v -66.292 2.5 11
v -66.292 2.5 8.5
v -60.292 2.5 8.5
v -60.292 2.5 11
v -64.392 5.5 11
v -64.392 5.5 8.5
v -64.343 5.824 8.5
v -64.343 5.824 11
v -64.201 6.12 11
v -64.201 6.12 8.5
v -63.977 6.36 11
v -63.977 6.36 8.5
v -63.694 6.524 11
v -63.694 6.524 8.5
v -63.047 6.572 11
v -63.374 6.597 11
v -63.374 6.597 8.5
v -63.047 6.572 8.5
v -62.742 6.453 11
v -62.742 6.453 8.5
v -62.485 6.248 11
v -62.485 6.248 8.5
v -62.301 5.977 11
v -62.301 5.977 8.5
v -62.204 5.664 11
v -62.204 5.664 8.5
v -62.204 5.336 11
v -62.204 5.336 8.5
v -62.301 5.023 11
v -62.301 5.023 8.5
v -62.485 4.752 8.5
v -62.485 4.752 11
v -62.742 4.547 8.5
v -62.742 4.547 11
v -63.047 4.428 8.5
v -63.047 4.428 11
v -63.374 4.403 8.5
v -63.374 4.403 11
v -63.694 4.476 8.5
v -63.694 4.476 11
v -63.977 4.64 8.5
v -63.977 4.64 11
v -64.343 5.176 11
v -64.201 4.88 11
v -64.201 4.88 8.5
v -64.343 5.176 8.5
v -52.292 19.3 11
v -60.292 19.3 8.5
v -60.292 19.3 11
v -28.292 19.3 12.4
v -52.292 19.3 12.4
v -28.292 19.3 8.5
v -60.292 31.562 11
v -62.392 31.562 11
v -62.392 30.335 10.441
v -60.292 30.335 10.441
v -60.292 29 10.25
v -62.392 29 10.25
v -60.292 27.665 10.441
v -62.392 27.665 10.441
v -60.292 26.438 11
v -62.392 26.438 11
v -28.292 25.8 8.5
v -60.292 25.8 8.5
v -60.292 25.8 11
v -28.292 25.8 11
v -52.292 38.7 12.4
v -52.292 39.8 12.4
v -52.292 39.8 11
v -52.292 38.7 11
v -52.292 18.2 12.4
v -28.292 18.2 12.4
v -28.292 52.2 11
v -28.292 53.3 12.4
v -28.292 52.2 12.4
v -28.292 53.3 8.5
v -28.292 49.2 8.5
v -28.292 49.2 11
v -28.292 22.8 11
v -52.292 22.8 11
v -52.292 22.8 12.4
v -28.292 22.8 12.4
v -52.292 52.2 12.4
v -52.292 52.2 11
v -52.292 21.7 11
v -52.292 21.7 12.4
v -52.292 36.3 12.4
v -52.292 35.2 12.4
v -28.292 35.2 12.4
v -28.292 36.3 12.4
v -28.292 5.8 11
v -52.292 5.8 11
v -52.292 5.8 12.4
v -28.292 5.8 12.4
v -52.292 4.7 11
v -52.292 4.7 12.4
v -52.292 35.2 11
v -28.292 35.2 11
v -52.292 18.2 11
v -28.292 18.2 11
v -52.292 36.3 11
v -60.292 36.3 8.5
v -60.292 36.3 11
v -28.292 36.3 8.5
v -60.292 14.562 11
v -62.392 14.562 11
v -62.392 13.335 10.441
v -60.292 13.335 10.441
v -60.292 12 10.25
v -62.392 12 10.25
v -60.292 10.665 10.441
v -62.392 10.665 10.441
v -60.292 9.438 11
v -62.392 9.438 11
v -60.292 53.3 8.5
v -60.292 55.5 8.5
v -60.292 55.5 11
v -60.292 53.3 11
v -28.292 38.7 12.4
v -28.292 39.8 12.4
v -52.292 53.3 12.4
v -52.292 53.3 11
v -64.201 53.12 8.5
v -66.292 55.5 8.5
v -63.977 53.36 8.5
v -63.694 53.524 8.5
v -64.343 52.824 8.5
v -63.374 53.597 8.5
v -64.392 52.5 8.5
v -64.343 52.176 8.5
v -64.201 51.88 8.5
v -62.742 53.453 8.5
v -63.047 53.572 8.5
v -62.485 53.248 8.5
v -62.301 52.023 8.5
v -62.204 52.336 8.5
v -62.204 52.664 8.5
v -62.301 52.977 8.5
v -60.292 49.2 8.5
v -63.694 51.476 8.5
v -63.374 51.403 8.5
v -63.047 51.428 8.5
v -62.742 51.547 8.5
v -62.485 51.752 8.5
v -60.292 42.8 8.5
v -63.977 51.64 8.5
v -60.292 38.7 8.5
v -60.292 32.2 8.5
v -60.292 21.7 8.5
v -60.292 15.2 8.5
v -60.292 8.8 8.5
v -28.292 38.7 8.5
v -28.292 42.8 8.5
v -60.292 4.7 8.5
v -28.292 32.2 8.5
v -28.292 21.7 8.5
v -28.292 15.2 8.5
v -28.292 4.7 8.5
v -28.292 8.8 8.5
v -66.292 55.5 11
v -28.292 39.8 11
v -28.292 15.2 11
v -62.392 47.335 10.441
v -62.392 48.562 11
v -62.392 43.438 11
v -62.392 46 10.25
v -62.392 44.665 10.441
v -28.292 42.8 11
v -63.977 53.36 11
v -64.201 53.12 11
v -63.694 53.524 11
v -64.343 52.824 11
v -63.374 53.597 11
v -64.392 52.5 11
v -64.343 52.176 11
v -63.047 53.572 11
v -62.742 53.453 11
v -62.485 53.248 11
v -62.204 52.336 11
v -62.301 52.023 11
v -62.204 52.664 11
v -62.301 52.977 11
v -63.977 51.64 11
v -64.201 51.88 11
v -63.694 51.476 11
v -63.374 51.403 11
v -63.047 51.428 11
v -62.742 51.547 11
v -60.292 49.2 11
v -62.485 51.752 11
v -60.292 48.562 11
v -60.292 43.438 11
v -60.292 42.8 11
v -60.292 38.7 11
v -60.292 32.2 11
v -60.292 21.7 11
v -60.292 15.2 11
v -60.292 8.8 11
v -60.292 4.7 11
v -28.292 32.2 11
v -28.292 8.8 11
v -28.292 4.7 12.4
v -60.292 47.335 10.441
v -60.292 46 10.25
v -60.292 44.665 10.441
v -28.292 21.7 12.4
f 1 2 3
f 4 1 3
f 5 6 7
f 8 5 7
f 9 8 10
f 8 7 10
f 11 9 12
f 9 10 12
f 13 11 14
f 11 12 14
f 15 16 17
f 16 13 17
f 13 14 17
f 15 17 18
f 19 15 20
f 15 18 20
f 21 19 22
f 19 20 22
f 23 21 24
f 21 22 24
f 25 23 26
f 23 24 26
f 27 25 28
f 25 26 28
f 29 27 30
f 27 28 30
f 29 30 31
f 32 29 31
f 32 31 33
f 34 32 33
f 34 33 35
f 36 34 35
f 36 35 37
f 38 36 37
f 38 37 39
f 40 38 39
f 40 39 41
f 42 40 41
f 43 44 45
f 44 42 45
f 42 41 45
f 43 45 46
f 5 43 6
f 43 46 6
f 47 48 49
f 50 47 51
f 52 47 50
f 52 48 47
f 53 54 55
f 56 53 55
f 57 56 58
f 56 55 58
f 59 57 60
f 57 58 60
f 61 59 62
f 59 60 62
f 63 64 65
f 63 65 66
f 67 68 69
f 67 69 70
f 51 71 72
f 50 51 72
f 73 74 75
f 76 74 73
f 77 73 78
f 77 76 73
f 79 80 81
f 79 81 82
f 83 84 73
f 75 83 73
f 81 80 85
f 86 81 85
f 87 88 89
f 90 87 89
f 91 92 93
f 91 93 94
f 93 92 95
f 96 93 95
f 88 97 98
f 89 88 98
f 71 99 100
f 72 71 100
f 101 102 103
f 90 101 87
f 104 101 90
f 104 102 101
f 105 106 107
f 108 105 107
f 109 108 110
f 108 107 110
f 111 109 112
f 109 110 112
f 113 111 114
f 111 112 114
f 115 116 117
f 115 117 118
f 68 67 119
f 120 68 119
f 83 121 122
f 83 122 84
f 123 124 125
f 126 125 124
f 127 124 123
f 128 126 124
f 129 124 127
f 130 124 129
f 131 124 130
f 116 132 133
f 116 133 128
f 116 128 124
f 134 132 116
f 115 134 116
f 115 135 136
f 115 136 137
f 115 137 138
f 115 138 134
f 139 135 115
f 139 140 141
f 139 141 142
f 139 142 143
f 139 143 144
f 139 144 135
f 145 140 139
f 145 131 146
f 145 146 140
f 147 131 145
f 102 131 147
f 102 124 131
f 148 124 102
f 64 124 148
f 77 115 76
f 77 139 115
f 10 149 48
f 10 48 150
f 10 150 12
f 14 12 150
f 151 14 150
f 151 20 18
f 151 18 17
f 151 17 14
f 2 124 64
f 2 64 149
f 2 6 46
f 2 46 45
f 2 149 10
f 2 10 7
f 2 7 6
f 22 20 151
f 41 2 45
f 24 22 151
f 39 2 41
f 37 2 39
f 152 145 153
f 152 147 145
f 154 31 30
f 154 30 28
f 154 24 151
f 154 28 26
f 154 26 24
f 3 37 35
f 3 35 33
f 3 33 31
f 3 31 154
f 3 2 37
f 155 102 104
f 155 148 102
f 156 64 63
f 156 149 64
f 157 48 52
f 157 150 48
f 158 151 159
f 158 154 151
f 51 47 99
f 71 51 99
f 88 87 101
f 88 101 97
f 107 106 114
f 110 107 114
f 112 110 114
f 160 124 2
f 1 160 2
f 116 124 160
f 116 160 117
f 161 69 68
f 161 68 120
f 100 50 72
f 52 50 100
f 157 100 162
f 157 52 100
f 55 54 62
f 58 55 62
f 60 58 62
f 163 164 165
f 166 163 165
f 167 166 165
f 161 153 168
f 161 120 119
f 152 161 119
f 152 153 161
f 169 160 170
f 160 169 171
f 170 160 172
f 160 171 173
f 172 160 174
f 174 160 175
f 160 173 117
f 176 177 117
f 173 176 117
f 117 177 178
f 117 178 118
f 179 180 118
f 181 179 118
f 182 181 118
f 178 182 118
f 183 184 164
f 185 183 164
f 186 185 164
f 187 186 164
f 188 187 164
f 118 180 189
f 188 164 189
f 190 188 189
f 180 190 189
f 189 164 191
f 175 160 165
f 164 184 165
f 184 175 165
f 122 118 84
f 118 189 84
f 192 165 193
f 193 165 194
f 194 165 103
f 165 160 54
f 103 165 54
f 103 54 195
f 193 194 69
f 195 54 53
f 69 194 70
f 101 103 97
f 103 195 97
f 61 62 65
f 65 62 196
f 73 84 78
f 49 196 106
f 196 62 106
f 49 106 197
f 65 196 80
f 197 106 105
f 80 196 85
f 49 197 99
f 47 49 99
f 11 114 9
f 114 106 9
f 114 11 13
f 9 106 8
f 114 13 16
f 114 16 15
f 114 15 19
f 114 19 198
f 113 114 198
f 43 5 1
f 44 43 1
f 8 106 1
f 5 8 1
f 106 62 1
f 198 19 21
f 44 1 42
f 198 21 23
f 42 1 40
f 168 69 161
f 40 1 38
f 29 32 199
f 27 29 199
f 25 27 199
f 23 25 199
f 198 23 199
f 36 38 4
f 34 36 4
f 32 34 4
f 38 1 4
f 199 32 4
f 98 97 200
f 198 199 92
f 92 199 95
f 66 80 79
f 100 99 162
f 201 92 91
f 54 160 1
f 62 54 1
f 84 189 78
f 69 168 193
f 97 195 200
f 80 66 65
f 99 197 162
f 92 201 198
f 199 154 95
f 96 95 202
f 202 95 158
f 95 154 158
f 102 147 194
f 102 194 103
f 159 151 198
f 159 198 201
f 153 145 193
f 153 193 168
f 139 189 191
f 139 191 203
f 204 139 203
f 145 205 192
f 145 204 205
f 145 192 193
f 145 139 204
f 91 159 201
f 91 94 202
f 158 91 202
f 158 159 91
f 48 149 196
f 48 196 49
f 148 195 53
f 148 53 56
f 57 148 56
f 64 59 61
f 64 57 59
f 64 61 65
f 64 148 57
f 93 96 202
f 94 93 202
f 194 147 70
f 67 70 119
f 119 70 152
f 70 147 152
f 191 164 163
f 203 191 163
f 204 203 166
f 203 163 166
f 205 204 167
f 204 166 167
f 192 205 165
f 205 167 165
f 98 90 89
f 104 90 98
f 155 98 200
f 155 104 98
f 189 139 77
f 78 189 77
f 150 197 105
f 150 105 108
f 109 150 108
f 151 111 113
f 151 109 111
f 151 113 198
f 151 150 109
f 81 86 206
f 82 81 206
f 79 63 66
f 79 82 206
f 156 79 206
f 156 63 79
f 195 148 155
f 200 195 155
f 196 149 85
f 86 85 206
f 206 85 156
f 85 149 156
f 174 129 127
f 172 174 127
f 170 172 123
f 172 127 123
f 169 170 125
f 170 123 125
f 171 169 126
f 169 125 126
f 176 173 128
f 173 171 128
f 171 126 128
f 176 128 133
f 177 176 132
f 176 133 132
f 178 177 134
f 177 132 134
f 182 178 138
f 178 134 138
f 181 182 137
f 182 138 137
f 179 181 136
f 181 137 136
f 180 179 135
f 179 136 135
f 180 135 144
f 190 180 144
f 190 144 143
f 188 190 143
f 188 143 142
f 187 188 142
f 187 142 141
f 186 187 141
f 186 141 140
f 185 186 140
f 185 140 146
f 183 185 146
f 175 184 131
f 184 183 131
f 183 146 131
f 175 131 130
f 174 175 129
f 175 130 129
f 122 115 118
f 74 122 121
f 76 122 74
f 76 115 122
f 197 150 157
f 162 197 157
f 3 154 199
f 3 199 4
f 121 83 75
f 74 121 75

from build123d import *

# Parameters (mm, degrees)
FRONT_GRIP_ACETAL_GUIDE_COMB_SKETCH_W  = 6
FRONT_GRIP_ACETAL_GUIDE_COMB_SKETCH_H  = 53
FRONT_GRIP_ACETAL_GUIDE_COMB_DEPTH     = 2.5
GRIP_GUIDE_LEDGE_1_LOWER_SKETCH_W      = 32.1
GRIP_GUIDE_LEDGE_1_LOWER_SKETCH_H      = 4.1
GRIP_GUIDE_LEDGE_1_LOWER_DEPTH         = 2.5
GRIP_GUIDE_LEDGE_1_UPPER_SKETCH_W      = 32.1
GRIP_GUIDE_LEDGE_1_UPPER_SKETCH_H      = 4.1
GRIP_GUIDE_LEDGE_1_UPPER_DEPTH         = 2.5
GRIP_GUIDE_FENCE_1_LOWER_SKETCH_W      = 24
GRIP_GUIDE_FENCE_1_LOWER_SKETCH_H      = 1.1
GRIP_GUIDE_FENCE_1_LOWER_DEPTH         = 1.5
GRIP_GUIDE_FENCE_1_UPPER_SKETCH_W      = 24
GRIP_GUIDE_FENCE_1_UPPER_SKETCH_H      = 1.1
GRIP_GUIDE_FENCE_1_UPPER_DEPTH         = 1.5
GRIP_GUIDE_LEDGE_2_LOWER_SKETCH_W      = 32.1
GRIP_GUIDE_LEDGE_2_LOWER_SKETCH_H      = 4.1
GRIP_GUIDE_LEDGE_2_LOWER_DEPTH         = 2.5
GRIP_GUIDE_LEDGE_2_UPPER_SKETCH_W      = 32.1
GRIP_GUIDE_LEDGE_2_UPPER_SKETCH_H      = 4.1
GRIP_GUIDE_LEDGE_2_UPPER_DEPTH         = 2.5
GRIP_GUIDE_FENCE_2_LOWER_SKETCH_W      = 24
GRIP_GUIDE_FENCE_2_LOWER_SKETCH_H      = 1.1
GRIP_GUIDE_FENCE_2_LOWER_DEPTH         = 1.5
GRIP_GUIDE_FENCE_2_UPPER_SKETCH_W      = 24
GRIP_GUIDE_FENCE_2_UPPER_SKETCH_H      = 1.1
GRIP_GUIDE_FENCE_2_UPPER_DEPTH         = 1.5
GRIP_GUIDE_LEDGE_3_LOWER_SKETCH_W      = 32.1
GRIP_GUIDE_LEDGE_3_LOWER_SKETCH_H      = 4.1
GRIP_GUIDE_LEDGE_3_LOWER_DEPTH         = 2.5
GRIP_GUIDE_LEDGE_3_UPPER_SKETCH_W      = 32.1
GRIP_GUIDE_LEDGE_3_UPPER_SKETCH_H      = 4.1
GRIP_GUIDE_LEDGE_3_UPPER_DEPTH         = 2.5
GRIP_GUIDE_FENCE_3_LOWER_SKETCH_W      = 24
GRIP_GUIDE_FENCE_3_LOWER_SKETCH_H      = 1.1
GRIP_GUIDE_FENCE_3_LOWER_DEPTH         = 1.5
GRIP_GUIDE_FENCE_3_UPPER_SKETCH_W      = 24
GRIP_GUIDE_FENCE_3_UPPER_SKETCH_H      = 1.1
GRIP_GUIDE_FENCE_3_UPPER_DEPTH         = 1.5
FRONT_GUIDE_SCREW_CLEARANCE_1_SKETCH_R = 1.1
FRONT_GUIDE_SCREW_CLEARANCE_1_DEPTH    = 2.7
FRONT_GUIDE_SCREW_CLEARANCE_2_SKETCH_R = 1.1
FRONT_GUIDE_SCREW_CLEARANCE_2_DEPTH    = 2.7
OUTLET_SEAT_CLEARANCE_1_SKETCH_R       = 4.75
OUTLET_SEAT_CLEARANCE_1_DEPTH          = 2.2
OUTLET_SEAT_CLEARANCE_2_SKETCH_R       = 4.75
OUTLET_SEAT_CLEARANCE_2_DEPTH          = 2.2
OUTLET_SEAT_CLEARANCE_3_SKETCH_R       = 4.75
OUTLET_SEAT_CLEARANCE_3_DEPTH          = 2.2


with BuildPart() as part:
    # Front Grip Acetal Guide Comb sketch → Front Grip Acetal Guide Comb (new body)
    with BuildSketch(Plane.XY.offset(8.5)):
        with Locations((-63.291651246, -29)):
            Rectangle(FRONT_GRIP_ACETAL_GUIDE_COMB_SKETCH_W, FRONT_GRIP_ACETAL_GUIDE_COMB_SKETCH_H)
    extrude(amount=FRONT_GRIP_ACETAL_GUIDE_COMB_DEPTH)

    # Grip Guide Ledge 1 Lower sketch → Grip Guide Ledge 1 Lower (add)
    with BuildSketch(Plane.XY.offset(8.5)):
        with Locations((-44.341651246, -6.75)):
            Rectangle(GRIP_GUIDE_LEDGE_1_LOWER_SKETCH_W, GRIP_GUIDE_LEDGE_1_LOWER_SKETCH_H)
    extrude(amount=GRIP_GUIDE_LEDGE_1_LOWER_DEPTH)

    # Grip Guide Ledge 1 Upper sketch → Grip Guide Ledge 1 Upper (add)
    with BuildSketch(Plane.XY.offset(8.5)):
        with Locations((-44.341651246, -17.25)):
            Rectangle(GRIP_GUIDE_LEDGE_1_UPPER_SKETCH_W, GRIP_GUIDE_LEDGE_1_UPPER_SKETCH_H)
    extrude(amount=GRIP_GUIDE_LEDGE_1_UPPER_DEPTH)

    # Grip Guide Fence 1 Lower sketch → Grip Guide Fence 1 Lower (add)
    with BuildSketch(Plane.XY.offset(10.9)):
        with Locations((-40.291651246, -5.25)):
            Rectangle(GRIP_GUIDE_FENCE_1_LOWER_SKETCH_W, GRIP_GUIDE_FENCE_1_LOWER_SKETCH_H)
    extrude(amount=GRIP_GUIDE_FENCE_1_LOWER_DEPTH)

    # Grip Guide Fence 1 Upper sketch → Grip Guide Fence 1 Upper (add)
    with BuildSketch(Plane.XY.offset(10.9)):
        with Locations((-40.291651246, -18.75)):
            Rectangle(GRIP_GUIDE_FENCE_1_UPPER_SKETCH_W, GRIP_GUIDE_FENCE_1_UPPER_SKETCH_H)
    extrude(amount=GRIP_GUIDE_FENCE_1_UPPER_DEPTH)

    # Grip Guide Ledge 2 Lower sketch → Grip Guide Ledge 2 Lower (add)
    with BuildSketch(Plane.XY.offset(8.5)):
        with Locations((-44.341651246, -23.75)):
            Rectangle(GRIP_GUIDE_LEDGE_2_LOWER_SKETCH_W, GRIP_GUIDE_LEDGE_2_LOWER_SKETCH_H)
    extrude(amount=GRIP_GUIDE_LEDGE_2_LOWER_DEPTH)

    # Grip Guide Ledge 2 Upper sketch → Grip Guide Ledge 2 Upper (add)
    with BuildSketch(Plane.XY.offset(8.5)):
        with Locations((-44.341651246, -34.25)):
            Rectangle(GRIP_GUIDE_LEDGE_2_UPPER_SKETCH_W, GRIP_GUIDE_LEDGE_2_UPPER_SKETCH_H)
    extrude(amount=GRIP_GUIDE_LEDGE_2_UPPER_DEPTH)

    # Grip Guide Fence 2 Lower sketch → Grip Guide Fence 2 Lower (add)
    with BuildSketch(Plane.XY.offset(10.9)):
        with Locations((-40.291651246, -22.25)):
            Rectangle(GRIP_GUIDE_FENCE_2_LOWER_SKETCH_W, GRIP_GUIDE_FENCE_2_LOWER_SKETCH_H)
    extrude(amount=GRIP_GUIDE_FENCE_2_LOWER_DEPTH)

    # Grip Guide Fence 2 Upper sketch → Grip Guide Fence 2 Upper (add)
    with BuildSketch(Plane.XY.offset(10.9)):
        with Locations((-40.291651246, -35.75)):
            Rectangle(GRIP_GUIDE_FENCE_2_UPPER_SKETCH_W, GRIP_GUIDE_FENCE_2_UPPER_SKETCH_H)
    extrude(amount=GRIP_GUIDE_FENCE_2_UPPER_DEPTH)

    # Grip Guide Ledge 3 Lower sketch → Grip Guide Ledge 3 Lower (add)
    with BuildSketch(Plane.XY.offset(8.5)):
        with Locations((-44.341651246, -40.75)):
            Rectangle(GRIP_GUIDE_LEDGE_3_LOWER_SKETCH_W, GRIP_GUIDE_LEDGE_3_LOWER_SKETCH_H)
    extrude(amount=GRIP_GUIDE_LEDGE_3_LOWER_DEPTH)

    # Grip Guide Ledge 3 Upper sketch → Grip Guide Ledge 3 Upper (add)
    with BuildSketch(Plane.XY.offset(8.5)):
        with Locations((-44.341651246, -51.25)):
            Rectangle(GRIP_GUIDE_LEDGE_3_UPPER_SKETCH_W, GRIP_GUIDE_LEDGE_3_UPPER_SKETCH_H)
    extrude(amount=GRIP_GUIDE_LEDGE_3_UPPER_DEPTH)

    # Grip Guide Fence 3 Lower sketch → Grip Guide Fence 3 Lower (add)
    with BuildSketch(Plane.XY.offset(10.9)):
        with Locations((-40.291651246, -39.25)):
            Rectangle(GRIP_GUIDE_FENCE_3_LOWER_SKETCH_W, GRIP_GUIDE_FENCE_3_LOWER_SKETCH_H)
    extrude(amount=GRIP_GUIDE_FENCE_3_LOWER_DEPTH)

    # Grip Guide Fence 3 Upper sketch → Grip Guide Fence 3 Upper (add)
    with BuildSketch(Plane.XY.offset(10.9)):
        with Locations((-40.291651246, -52.75)):
            Rectangle(GRIP_GUIDE_FENCE_3_UPPER_SKETCH_W, GRIP_GUIDE_FENCE_3_UPPER_SKETCH_H)
    extrude(amount=GRIP_GUIDE_FENCE_3_UPPER_DEPTH)

    # Front Guide Screw Clearance 1 sketch → Front Guide Screw Clearance 1 (cut)
    with BuildSketch(Plane.XY.offset(8.4)):
        with Locations(Location((-63.291651246, -5.5, 0), (0, 0, 180))):
            Circle(FRONT_GUIDE_SCREW_CLEARANCE_1_SKETCH_R)
    extrude(amount=FRONT_GUIDE_SCREW_CLEARANCE_1_DEPTH, mode=Mode.SUBTRACT)

    # Front Guide Screw Clearance 2 sketch → Front Guide Screw Clearance 2 (cut)
    with BuildSketch(Plane.XY.offset(8.4)):
        with Locations(Location((-63.291651246, -52.5, 0), (0, 0, 180))):
            Circle(FRONT_GUIDE_SCREW_CLEARANCE_2_SKETCH_R)
    extrude(amount=FRONT_GUIDE_SCREW_CLEARANCE_2_DEPTH, mode=Mode.SUBTRACT)

    # Outlet seat clearance 1 sketch → Outlet seat clearance 1 (cut)
    with BuildSketch(Plane(origin=(-62.391651246, 0, 0), x_dir=(0, 0, -1), z_dir=(1, 0, 0))):
        with Locations((-15, -12)):
            Circle(OUTLET_SEAT_CLEARANCE_1_SKETCH_R)
    extrude(amount=OUTLET_SEAT_CLEARANCE_1_DEPTH, mode=Mode.SUBTRACT)

    # Outlet seat clearance 2 sketch → Outlet seat clearance 2 (cut)
    with BuildSketch(Plane(origin=(-62.391651246, 0, 0), x_dir=(0, 0, -1), z_dir=(1, 0, 0))):
        with Locations((-15, -29)):
            Circle(OUTLET_SEAT_CLEARANCE_2_SKETCH_R)
    extrude(amount=OUTLET_SEAT_CLEARANCE_2_DEPTH, mode=Mode.SUBTRACT)

    # Outlet seat clearance 3 sketch → Outlet seat clearance 3 (cut)
    with BuildSketch(Plane(origin=(-62.391651246, 0, 0), x_dir=(0, 0, -1), z_dir=(1, 0, 0))):
        with Locations((-15, -46)):
            Circle(OUTLET_SEAT_CLEARANCE_3_SKETCH_R)
    extrude(amount=OUTLET_SEAT_CLEARANCE_3_DEPTH, mode=Mode.SUBTRACT)


with BuildPart() as body_2:
    # Mirror1: mirrored copy
    add(part.part.mirror(Plane(origin=(0, 0, 0), x_dir=(0, 0, 1), z_dir=(0, -1, 0))))


solid = body_2.part
